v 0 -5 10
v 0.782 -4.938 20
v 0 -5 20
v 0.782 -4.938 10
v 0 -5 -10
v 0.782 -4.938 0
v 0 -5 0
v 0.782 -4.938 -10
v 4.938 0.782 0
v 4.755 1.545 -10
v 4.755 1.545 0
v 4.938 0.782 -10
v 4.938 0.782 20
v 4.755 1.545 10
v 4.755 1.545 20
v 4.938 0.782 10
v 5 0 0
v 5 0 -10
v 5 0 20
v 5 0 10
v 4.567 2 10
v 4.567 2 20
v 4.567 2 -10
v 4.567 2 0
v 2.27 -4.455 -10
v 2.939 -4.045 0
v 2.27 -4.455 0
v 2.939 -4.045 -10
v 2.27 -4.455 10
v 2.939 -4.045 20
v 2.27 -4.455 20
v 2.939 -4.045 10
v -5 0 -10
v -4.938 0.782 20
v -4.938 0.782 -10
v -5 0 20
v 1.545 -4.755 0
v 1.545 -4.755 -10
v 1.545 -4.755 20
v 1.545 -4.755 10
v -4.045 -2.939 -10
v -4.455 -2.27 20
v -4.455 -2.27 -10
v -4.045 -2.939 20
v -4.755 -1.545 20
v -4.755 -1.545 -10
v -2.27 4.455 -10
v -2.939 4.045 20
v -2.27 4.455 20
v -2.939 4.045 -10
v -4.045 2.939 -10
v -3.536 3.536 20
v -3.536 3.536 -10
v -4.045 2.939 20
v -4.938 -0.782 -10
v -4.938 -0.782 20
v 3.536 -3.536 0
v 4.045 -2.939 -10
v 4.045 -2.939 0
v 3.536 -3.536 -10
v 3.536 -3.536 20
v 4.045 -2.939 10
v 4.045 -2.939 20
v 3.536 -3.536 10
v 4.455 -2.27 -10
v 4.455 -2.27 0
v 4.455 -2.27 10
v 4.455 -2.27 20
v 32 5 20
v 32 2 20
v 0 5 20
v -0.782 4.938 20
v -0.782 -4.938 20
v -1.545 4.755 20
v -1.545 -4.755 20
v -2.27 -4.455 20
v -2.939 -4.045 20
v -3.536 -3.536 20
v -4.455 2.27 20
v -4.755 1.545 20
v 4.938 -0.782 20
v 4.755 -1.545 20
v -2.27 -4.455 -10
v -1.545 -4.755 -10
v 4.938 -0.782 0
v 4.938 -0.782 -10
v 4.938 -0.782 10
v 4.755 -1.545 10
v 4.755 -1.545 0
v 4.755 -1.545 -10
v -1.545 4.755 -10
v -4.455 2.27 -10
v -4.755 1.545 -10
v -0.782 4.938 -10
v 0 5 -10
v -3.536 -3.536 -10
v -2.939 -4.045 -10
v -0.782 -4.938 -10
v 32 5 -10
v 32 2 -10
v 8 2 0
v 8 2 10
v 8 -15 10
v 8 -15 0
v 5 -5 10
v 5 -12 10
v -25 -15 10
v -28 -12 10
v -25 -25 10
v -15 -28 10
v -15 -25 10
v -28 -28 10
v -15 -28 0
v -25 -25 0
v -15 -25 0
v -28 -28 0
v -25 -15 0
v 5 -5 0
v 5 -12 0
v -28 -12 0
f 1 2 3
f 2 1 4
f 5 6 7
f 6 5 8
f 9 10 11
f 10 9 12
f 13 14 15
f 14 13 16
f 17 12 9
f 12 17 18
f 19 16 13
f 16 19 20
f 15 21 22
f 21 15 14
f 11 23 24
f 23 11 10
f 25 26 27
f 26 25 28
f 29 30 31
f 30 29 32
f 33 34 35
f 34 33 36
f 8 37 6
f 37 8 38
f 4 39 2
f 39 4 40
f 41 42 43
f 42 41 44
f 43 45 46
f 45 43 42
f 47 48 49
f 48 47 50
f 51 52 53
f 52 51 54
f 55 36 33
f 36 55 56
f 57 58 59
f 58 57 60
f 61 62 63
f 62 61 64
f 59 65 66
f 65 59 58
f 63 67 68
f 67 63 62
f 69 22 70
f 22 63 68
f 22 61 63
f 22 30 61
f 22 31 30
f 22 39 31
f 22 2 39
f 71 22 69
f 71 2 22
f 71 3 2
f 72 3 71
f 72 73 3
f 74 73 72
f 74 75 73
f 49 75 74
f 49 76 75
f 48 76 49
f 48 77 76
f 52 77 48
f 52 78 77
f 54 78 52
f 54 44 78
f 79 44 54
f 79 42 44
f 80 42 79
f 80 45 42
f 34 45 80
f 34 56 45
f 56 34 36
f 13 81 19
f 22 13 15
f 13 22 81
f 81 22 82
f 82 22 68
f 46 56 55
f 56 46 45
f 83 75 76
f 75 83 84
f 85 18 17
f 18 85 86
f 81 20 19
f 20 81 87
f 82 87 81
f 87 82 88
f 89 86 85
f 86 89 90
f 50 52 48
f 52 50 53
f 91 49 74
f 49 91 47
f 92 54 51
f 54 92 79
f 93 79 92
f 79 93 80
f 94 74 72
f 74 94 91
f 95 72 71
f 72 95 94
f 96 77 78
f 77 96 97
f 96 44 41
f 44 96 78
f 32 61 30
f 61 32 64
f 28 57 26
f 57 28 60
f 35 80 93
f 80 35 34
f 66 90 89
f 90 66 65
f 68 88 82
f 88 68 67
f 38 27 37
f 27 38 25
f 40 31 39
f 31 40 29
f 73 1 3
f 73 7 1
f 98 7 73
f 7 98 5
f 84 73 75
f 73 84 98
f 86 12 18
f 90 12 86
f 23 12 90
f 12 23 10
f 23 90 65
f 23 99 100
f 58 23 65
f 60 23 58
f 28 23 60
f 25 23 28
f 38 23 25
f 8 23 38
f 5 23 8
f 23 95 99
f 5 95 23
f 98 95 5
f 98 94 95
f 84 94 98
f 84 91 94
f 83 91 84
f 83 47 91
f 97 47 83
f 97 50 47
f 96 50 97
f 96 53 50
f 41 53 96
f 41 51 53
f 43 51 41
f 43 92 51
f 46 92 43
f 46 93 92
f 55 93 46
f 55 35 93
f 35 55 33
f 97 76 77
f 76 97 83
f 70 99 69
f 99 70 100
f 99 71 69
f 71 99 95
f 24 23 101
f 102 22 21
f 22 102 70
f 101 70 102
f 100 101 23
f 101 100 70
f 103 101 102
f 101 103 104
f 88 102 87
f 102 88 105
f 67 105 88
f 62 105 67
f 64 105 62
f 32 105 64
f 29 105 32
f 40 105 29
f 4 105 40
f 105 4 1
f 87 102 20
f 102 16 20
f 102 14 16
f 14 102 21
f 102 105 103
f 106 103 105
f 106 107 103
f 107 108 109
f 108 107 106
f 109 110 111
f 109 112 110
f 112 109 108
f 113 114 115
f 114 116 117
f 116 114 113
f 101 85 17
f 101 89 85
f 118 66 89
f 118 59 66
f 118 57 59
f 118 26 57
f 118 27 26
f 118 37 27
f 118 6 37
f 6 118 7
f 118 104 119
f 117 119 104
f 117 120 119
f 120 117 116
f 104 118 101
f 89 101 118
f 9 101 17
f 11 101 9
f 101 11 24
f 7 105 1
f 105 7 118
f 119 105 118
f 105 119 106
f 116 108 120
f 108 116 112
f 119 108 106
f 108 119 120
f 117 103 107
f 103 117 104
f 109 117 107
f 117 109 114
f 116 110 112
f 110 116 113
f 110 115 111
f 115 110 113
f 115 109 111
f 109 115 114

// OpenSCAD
/*
 * IKEA Voxtorp Towel Hook by Luiz Motta
 * https://www.thingiverse.com/luizmotta/about
 */
$fn=40;

d=10;
plate_height=32;
plate_width=30;

hook_width=10;
hook_depth=10;
hook_length=25;

thickness=3;

translate( [0, 0, -(plate_width-hook_width)/2] ) {
    cylinder( plate_width, d/2, d/2 );
    translate( [0, d/2-thickness, 0] ) cube( [plate_height, thickness, plate_width]);
}
translate( [0, -d/2, 0] ) cube( [d/2+thickness, d, hook_width]);
translate( [5, -13, 0] ) cube( [thickness, 15, hook_width]);
translate( [-hook_length -thickness, -12 -thickness, 0] ) cube( [ 5 + hook_length + 2*thickness, thickness, hook_width ]);
translate( [-hook_length -thickness, -15 -thickness -hook_depth, 0] ) cube( [ thickness, hook_depth + thickness, hook_width ]);
translate( [-hook_length, -15 -thickness -hook_depth, 0] ) cube( [ hook_depth, thickness, hook_width ]);
